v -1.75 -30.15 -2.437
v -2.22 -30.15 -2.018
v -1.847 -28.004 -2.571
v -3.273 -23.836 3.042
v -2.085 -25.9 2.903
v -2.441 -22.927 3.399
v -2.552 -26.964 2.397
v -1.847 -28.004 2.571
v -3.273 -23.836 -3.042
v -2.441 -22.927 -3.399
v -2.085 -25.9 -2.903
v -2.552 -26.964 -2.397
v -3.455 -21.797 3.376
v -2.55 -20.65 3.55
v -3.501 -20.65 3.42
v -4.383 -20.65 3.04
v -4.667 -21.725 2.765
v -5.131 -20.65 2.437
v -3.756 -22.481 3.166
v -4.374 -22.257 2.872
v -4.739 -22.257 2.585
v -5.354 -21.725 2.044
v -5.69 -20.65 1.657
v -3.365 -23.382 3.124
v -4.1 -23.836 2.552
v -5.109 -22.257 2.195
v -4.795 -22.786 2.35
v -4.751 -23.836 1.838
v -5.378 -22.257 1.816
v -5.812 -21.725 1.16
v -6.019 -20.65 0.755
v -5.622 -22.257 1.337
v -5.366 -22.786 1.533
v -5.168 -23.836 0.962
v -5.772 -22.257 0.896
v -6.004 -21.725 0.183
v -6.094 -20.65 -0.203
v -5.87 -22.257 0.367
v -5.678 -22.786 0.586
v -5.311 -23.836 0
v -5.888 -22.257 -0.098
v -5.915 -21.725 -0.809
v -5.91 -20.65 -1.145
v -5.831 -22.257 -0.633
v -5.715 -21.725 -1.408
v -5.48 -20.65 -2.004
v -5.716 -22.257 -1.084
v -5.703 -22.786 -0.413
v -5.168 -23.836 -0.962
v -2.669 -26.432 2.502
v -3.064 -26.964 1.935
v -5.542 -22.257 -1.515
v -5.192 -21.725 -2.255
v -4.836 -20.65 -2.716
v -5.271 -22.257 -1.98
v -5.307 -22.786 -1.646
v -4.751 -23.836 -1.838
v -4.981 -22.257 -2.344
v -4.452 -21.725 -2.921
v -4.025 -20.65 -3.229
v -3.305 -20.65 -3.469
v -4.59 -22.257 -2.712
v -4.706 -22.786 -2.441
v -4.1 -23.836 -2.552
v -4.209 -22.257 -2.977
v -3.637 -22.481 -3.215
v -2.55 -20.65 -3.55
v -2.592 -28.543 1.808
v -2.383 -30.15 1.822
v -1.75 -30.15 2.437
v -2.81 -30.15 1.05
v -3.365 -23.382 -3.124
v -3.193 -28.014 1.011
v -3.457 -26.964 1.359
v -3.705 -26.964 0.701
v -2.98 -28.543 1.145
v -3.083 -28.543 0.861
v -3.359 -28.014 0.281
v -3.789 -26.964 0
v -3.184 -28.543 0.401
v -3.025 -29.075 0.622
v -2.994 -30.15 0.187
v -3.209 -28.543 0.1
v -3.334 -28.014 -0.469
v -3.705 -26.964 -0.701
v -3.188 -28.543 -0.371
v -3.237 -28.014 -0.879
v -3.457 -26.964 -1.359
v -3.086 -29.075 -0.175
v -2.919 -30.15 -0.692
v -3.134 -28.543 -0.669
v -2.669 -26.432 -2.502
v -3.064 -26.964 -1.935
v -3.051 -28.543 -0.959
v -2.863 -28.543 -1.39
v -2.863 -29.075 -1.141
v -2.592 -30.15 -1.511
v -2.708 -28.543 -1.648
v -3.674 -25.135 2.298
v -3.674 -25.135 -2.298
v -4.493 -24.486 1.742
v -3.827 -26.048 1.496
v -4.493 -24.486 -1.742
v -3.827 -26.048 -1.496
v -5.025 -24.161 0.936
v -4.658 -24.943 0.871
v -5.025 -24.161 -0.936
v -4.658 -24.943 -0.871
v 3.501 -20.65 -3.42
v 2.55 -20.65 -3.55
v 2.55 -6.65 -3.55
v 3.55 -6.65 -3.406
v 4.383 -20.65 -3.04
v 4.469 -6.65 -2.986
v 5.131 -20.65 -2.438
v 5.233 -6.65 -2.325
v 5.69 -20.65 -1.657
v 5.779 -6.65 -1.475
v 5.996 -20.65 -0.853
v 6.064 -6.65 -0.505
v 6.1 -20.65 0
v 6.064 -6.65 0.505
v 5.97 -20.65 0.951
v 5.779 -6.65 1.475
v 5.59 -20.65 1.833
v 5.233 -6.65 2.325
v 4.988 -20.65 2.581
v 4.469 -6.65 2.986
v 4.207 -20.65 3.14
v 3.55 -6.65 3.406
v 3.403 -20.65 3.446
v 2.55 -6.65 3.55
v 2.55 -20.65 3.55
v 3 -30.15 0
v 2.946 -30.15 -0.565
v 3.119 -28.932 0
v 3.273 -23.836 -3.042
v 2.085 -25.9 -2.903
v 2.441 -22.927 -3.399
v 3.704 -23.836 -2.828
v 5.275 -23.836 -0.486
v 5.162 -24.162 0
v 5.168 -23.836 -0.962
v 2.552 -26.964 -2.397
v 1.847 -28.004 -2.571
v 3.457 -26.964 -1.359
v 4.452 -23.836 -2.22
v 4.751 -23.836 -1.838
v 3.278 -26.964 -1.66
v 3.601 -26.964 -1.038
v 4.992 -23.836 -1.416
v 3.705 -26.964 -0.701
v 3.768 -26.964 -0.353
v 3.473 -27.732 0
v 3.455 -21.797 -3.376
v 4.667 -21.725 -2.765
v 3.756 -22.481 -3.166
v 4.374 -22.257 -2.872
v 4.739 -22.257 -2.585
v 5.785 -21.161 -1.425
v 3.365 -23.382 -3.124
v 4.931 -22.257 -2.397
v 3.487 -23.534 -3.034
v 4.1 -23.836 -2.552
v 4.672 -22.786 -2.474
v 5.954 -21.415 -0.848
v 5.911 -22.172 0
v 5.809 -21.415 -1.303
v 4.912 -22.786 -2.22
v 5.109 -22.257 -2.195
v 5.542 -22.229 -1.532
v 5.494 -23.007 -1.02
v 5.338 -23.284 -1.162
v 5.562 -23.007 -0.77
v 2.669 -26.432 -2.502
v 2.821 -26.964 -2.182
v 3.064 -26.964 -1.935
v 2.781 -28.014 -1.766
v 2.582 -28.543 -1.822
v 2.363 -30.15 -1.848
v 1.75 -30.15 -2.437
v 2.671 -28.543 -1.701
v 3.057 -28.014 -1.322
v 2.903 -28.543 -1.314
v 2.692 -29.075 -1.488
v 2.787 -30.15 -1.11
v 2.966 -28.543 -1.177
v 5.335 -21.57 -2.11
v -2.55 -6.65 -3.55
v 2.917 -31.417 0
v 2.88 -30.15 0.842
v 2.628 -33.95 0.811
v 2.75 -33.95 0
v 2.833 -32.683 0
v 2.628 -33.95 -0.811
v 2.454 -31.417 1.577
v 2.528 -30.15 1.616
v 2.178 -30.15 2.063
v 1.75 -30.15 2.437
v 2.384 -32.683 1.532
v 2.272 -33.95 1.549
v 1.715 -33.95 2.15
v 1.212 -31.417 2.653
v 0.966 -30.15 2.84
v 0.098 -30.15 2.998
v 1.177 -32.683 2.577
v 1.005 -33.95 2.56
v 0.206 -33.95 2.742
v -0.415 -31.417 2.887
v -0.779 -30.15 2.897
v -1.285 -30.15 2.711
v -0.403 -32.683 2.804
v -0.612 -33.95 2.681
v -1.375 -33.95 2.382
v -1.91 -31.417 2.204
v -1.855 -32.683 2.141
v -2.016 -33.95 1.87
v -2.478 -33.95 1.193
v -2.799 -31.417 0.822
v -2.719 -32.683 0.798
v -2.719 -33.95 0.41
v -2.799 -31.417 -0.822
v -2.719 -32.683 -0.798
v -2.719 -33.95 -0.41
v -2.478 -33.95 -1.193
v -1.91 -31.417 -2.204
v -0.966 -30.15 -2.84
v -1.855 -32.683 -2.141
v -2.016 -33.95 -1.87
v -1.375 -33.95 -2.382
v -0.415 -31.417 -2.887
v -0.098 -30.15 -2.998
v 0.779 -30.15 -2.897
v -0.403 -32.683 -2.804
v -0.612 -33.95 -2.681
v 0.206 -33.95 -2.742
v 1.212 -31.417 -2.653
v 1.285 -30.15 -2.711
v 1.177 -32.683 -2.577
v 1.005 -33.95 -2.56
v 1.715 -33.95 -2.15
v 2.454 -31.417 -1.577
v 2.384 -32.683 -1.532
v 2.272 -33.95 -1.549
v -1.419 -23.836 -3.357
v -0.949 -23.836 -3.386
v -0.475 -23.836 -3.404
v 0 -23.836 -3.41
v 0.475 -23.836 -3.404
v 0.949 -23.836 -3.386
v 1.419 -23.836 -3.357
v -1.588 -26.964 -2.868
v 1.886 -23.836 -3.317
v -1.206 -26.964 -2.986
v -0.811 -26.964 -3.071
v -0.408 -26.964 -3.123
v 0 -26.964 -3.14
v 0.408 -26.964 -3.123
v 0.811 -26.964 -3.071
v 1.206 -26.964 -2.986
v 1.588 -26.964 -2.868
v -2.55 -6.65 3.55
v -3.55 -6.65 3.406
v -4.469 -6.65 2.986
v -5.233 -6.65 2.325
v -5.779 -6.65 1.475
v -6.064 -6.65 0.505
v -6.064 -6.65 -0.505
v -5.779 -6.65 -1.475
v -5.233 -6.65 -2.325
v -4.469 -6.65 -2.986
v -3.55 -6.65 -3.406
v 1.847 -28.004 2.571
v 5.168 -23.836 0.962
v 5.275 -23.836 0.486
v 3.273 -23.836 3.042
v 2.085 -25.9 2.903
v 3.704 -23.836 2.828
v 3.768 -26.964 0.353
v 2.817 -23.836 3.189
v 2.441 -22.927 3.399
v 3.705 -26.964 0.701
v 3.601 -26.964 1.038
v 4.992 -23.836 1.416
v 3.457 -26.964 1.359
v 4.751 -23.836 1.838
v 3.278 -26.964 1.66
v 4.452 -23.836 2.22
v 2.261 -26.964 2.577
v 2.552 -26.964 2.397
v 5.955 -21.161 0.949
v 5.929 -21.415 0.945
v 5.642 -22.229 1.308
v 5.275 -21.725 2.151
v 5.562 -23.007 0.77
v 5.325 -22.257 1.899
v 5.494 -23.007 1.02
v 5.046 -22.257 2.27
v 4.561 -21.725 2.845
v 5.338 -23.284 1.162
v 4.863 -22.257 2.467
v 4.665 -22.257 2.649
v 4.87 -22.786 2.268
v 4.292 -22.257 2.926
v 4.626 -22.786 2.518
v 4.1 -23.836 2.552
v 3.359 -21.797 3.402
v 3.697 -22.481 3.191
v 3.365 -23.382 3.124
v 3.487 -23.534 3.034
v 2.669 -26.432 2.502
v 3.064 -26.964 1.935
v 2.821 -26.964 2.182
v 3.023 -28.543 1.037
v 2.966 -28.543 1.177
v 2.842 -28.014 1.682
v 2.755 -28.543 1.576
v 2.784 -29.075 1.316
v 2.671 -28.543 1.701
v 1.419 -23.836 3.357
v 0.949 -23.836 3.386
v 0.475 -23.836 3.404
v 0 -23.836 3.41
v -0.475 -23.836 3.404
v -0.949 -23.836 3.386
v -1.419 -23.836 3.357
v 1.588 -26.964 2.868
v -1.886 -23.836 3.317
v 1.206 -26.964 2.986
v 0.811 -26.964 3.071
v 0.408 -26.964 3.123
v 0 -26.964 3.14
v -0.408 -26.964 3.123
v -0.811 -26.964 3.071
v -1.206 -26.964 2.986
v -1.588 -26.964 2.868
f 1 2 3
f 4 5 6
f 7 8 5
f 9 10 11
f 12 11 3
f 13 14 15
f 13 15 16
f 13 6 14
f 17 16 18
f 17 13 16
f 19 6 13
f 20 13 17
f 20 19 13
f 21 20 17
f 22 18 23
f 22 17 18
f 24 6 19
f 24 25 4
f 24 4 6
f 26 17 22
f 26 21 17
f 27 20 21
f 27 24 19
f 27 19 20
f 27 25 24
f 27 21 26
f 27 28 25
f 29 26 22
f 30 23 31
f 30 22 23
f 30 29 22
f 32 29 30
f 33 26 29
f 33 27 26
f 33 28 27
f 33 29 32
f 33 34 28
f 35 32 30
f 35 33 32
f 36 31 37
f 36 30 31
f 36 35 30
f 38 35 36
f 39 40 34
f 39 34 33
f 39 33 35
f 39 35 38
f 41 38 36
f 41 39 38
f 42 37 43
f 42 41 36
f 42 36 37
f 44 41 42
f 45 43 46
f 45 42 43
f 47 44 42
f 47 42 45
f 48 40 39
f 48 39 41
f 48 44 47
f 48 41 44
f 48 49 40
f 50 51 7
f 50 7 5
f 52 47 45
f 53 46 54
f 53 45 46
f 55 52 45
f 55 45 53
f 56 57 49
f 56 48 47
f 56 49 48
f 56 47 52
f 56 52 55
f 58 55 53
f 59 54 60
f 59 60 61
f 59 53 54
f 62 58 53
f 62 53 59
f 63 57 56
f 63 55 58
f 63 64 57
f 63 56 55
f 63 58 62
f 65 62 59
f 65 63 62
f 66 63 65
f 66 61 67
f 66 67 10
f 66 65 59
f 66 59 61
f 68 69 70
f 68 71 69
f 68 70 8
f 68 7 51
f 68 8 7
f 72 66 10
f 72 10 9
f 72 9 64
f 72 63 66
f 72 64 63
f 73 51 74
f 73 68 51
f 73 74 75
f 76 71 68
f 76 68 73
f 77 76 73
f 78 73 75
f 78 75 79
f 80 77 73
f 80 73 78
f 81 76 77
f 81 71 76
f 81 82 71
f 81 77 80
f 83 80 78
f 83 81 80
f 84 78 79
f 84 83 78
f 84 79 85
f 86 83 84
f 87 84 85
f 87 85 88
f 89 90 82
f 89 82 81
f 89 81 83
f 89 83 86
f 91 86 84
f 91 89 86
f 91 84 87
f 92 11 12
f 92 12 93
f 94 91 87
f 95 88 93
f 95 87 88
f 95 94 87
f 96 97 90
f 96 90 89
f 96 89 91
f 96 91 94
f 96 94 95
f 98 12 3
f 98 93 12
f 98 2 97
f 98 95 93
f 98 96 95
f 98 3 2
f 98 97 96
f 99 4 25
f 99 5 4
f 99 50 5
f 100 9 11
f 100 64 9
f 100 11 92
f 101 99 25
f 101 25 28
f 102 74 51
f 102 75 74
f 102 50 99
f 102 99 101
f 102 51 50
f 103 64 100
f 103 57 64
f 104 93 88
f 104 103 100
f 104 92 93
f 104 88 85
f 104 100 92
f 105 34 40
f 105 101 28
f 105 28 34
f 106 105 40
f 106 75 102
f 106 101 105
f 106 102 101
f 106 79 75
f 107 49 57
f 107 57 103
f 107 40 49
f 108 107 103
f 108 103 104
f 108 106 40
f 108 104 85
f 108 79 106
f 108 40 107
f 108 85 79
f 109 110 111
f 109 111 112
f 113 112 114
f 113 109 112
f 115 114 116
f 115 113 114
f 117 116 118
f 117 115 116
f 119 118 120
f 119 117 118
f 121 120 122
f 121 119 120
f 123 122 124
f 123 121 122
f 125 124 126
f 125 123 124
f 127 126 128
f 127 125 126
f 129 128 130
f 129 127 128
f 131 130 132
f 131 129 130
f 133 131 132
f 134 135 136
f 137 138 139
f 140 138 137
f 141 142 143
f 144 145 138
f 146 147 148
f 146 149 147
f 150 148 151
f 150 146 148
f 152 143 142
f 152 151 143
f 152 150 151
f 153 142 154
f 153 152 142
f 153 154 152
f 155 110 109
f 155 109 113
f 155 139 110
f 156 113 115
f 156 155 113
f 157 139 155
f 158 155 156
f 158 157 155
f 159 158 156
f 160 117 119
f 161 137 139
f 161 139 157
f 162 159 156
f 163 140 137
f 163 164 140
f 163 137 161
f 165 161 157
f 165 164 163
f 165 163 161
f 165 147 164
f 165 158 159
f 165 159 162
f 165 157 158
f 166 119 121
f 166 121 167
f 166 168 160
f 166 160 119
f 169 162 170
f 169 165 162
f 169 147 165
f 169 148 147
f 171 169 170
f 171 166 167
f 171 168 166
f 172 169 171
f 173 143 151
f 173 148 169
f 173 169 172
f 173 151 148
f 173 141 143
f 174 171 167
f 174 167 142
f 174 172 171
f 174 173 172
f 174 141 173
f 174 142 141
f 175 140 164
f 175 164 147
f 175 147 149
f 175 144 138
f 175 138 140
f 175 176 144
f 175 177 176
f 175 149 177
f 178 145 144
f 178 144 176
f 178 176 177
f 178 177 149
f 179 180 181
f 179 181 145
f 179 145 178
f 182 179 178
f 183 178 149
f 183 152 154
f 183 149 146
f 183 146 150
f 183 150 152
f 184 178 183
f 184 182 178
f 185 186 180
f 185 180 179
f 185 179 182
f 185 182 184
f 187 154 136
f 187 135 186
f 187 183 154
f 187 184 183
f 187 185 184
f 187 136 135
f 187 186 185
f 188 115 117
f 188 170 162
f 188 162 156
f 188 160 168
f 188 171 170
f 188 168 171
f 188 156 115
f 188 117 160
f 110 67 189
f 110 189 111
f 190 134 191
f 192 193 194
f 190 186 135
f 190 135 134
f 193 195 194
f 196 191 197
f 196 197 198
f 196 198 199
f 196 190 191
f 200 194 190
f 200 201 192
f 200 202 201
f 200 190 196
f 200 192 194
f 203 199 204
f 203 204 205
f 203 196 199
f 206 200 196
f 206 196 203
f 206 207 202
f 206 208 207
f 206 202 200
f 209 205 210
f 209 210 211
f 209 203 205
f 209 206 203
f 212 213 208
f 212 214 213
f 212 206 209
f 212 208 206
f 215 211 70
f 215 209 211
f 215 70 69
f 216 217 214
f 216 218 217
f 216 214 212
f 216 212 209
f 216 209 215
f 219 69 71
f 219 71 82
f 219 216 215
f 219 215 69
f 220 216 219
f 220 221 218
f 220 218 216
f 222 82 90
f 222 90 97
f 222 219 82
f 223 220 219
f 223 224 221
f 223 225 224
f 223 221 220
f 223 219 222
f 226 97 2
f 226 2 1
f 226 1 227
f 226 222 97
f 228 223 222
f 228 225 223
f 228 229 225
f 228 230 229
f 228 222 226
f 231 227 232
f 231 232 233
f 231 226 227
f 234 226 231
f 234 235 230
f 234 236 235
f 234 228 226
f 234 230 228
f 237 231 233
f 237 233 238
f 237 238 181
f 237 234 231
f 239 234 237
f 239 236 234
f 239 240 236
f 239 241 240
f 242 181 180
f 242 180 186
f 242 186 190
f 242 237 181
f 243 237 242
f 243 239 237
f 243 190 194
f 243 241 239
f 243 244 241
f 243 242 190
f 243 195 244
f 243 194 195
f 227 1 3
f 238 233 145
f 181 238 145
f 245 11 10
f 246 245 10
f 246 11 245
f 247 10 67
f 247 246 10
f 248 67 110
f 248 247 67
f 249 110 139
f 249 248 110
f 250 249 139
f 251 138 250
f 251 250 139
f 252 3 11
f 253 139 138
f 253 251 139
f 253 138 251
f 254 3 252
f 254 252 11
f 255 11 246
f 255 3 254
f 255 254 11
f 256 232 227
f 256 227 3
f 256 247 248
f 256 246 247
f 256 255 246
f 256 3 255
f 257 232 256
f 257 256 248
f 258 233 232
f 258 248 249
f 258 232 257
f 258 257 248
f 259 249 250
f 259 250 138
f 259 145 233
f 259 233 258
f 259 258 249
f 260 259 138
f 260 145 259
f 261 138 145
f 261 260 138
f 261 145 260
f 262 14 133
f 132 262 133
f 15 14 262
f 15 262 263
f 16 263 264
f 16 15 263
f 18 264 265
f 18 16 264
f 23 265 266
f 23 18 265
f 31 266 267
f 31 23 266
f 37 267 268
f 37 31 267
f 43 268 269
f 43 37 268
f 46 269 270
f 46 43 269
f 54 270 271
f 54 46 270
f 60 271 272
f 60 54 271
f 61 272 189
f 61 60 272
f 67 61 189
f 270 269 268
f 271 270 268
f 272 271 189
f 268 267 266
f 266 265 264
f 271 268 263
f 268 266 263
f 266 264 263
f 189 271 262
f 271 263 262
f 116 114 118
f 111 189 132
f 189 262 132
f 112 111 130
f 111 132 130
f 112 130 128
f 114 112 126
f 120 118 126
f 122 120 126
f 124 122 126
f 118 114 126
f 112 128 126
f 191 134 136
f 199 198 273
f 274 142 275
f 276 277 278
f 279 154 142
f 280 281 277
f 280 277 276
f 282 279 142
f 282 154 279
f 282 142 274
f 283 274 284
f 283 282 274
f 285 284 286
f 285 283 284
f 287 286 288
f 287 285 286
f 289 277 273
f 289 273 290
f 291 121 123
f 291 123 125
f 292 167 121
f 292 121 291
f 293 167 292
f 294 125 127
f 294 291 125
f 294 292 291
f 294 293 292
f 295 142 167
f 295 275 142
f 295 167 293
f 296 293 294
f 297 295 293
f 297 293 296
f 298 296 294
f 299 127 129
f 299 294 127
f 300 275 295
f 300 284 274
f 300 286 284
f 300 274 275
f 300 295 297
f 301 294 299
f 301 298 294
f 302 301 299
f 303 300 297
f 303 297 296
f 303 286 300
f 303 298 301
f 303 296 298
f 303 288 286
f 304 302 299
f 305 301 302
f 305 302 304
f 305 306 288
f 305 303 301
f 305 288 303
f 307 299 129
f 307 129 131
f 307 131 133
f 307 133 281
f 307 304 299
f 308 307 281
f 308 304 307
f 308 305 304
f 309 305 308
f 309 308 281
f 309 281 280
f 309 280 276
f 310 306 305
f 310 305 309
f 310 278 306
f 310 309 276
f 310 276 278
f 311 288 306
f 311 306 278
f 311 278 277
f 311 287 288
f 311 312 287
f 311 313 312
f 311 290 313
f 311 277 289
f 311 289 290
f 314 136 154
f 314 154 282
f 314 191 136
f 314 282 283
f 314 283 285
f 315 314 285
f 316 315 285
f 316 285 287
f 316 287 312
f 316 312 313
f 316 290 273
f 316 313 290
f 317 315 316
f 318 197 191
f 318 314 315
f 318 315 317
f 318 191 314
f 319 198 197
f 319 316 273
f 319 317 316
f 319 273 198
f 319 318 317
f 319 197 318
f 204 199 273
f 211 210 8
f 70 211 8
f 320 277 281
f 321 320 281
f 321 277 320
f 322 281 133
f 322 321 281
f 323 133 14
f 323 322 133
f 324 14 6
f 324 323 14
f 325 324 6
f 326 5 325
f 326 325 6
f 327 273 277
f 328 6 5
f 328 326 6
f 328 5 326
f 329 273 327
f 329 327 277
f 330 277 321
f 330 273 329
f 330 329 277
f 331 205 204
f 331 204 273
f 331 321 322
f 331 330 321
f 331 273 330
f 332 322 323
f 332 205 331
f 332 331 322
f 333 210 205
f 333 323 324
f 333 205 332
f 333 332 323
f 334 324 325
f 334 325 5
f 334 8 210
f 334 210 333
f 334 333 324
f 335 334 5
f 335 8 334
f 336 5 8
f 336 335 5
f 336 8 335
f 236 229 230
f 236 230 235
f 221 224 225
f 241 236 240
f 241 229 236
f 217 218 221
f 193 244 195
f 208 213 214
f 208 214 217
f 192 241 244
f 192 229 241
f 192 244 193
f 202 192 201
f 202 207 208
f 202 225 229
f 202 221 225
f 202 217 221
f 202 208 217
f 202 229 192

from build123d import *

# Parameters (mm, degrees)
SKETCH008_R        = 3
SKETCH012_R        = 3
SKETCH010_R        = 2.75
PAD019_DEPTH       = 14
BODY010_ROLL_ANGLE = 90


with BuildPart() as part:
    # Sketch009 → AdditiveLoft section 0
    with BuildSketch(Plane.XY.offset(14)):
        with BuildLine():
            ThreePointArc((-2.55, 3.55), (-6.1, 0), (-2.55, -3.55))
            Line((-2.55, -3.55), (2.55, -3.55))
            ThreePointArc((2.55, -3.55), (6.1, 0), (2.55, 3.55))
            Line((-2.55, 3.55), (2.55, 3.55))
        make_face()
    # Sketch011 → AdditiveLoft section 1
    with BuildSketch(Plane.XY.offset(14.2)):
        with BuildLine():
            ThreePointArc((-2.55, 3.55), (-6.1, 0), (-2.55, -3.55))
            Line((-2.55, -3.55), (2.55, -3.55))
            ThreePointArc((2.55, -3.55), (6.1, 0), (2.55, 3.55))
            Line((-2.55, 3.55), (2.55, 3.55))
        make_face()
    # Sketch008 → AdditiveLoft section 2
    with BuildSketch(Plane.XY.offset(23.3)):
        Circle(SKETCH008_R)
    # Sketch012 → AdditiveLoft section 3
    with BuildSketch(Plane.XY.offset(23.5)):
        Circle(SKETCH012_R)
    loft()

    # Sketch012 → AdditiveLoft001 section 0
    with BuildSketch(Plane.XY.offset(23.5)):
        Circle(SKETCH012_R)
    # Sketch010 → AdditiveLoft001 section 1
    with BuildSketch(Plane.XY.offset(27.3)):
        Circle(SKETCH010_R)
    loft()

    # Sketch009 → Pad019 (new body)
    with BuildSketch(Plane.XY.offset(14)):
        with BuildLine():
            ThreePointArc((-2.55, 3.55), (-6.1, 0), (-2.55, -3.55))
            Line((-2.55, -3.55), (2.55, -3.55))
            ThreePointArc((2.55, -3.55), (6.1, 0), (2.55, 3.55))
            Line((-2.55, 3.55), (2.55, 3.55))
        make_face()
    extrude(amount=-PAD019_DEPTH)


with BuildPart() as part_1:
    # Body010 roll: moved
    add(part.part.rotate(Axis((0, 0, 0), (1, 0, 0)), BODY010_ROLL_ANGLE))


with BuildPart() as part_2:
    # Body010 placement: moved
    add(part_1.part.moved(Location((0, -6.65, 0))))


solid = part_2.part
